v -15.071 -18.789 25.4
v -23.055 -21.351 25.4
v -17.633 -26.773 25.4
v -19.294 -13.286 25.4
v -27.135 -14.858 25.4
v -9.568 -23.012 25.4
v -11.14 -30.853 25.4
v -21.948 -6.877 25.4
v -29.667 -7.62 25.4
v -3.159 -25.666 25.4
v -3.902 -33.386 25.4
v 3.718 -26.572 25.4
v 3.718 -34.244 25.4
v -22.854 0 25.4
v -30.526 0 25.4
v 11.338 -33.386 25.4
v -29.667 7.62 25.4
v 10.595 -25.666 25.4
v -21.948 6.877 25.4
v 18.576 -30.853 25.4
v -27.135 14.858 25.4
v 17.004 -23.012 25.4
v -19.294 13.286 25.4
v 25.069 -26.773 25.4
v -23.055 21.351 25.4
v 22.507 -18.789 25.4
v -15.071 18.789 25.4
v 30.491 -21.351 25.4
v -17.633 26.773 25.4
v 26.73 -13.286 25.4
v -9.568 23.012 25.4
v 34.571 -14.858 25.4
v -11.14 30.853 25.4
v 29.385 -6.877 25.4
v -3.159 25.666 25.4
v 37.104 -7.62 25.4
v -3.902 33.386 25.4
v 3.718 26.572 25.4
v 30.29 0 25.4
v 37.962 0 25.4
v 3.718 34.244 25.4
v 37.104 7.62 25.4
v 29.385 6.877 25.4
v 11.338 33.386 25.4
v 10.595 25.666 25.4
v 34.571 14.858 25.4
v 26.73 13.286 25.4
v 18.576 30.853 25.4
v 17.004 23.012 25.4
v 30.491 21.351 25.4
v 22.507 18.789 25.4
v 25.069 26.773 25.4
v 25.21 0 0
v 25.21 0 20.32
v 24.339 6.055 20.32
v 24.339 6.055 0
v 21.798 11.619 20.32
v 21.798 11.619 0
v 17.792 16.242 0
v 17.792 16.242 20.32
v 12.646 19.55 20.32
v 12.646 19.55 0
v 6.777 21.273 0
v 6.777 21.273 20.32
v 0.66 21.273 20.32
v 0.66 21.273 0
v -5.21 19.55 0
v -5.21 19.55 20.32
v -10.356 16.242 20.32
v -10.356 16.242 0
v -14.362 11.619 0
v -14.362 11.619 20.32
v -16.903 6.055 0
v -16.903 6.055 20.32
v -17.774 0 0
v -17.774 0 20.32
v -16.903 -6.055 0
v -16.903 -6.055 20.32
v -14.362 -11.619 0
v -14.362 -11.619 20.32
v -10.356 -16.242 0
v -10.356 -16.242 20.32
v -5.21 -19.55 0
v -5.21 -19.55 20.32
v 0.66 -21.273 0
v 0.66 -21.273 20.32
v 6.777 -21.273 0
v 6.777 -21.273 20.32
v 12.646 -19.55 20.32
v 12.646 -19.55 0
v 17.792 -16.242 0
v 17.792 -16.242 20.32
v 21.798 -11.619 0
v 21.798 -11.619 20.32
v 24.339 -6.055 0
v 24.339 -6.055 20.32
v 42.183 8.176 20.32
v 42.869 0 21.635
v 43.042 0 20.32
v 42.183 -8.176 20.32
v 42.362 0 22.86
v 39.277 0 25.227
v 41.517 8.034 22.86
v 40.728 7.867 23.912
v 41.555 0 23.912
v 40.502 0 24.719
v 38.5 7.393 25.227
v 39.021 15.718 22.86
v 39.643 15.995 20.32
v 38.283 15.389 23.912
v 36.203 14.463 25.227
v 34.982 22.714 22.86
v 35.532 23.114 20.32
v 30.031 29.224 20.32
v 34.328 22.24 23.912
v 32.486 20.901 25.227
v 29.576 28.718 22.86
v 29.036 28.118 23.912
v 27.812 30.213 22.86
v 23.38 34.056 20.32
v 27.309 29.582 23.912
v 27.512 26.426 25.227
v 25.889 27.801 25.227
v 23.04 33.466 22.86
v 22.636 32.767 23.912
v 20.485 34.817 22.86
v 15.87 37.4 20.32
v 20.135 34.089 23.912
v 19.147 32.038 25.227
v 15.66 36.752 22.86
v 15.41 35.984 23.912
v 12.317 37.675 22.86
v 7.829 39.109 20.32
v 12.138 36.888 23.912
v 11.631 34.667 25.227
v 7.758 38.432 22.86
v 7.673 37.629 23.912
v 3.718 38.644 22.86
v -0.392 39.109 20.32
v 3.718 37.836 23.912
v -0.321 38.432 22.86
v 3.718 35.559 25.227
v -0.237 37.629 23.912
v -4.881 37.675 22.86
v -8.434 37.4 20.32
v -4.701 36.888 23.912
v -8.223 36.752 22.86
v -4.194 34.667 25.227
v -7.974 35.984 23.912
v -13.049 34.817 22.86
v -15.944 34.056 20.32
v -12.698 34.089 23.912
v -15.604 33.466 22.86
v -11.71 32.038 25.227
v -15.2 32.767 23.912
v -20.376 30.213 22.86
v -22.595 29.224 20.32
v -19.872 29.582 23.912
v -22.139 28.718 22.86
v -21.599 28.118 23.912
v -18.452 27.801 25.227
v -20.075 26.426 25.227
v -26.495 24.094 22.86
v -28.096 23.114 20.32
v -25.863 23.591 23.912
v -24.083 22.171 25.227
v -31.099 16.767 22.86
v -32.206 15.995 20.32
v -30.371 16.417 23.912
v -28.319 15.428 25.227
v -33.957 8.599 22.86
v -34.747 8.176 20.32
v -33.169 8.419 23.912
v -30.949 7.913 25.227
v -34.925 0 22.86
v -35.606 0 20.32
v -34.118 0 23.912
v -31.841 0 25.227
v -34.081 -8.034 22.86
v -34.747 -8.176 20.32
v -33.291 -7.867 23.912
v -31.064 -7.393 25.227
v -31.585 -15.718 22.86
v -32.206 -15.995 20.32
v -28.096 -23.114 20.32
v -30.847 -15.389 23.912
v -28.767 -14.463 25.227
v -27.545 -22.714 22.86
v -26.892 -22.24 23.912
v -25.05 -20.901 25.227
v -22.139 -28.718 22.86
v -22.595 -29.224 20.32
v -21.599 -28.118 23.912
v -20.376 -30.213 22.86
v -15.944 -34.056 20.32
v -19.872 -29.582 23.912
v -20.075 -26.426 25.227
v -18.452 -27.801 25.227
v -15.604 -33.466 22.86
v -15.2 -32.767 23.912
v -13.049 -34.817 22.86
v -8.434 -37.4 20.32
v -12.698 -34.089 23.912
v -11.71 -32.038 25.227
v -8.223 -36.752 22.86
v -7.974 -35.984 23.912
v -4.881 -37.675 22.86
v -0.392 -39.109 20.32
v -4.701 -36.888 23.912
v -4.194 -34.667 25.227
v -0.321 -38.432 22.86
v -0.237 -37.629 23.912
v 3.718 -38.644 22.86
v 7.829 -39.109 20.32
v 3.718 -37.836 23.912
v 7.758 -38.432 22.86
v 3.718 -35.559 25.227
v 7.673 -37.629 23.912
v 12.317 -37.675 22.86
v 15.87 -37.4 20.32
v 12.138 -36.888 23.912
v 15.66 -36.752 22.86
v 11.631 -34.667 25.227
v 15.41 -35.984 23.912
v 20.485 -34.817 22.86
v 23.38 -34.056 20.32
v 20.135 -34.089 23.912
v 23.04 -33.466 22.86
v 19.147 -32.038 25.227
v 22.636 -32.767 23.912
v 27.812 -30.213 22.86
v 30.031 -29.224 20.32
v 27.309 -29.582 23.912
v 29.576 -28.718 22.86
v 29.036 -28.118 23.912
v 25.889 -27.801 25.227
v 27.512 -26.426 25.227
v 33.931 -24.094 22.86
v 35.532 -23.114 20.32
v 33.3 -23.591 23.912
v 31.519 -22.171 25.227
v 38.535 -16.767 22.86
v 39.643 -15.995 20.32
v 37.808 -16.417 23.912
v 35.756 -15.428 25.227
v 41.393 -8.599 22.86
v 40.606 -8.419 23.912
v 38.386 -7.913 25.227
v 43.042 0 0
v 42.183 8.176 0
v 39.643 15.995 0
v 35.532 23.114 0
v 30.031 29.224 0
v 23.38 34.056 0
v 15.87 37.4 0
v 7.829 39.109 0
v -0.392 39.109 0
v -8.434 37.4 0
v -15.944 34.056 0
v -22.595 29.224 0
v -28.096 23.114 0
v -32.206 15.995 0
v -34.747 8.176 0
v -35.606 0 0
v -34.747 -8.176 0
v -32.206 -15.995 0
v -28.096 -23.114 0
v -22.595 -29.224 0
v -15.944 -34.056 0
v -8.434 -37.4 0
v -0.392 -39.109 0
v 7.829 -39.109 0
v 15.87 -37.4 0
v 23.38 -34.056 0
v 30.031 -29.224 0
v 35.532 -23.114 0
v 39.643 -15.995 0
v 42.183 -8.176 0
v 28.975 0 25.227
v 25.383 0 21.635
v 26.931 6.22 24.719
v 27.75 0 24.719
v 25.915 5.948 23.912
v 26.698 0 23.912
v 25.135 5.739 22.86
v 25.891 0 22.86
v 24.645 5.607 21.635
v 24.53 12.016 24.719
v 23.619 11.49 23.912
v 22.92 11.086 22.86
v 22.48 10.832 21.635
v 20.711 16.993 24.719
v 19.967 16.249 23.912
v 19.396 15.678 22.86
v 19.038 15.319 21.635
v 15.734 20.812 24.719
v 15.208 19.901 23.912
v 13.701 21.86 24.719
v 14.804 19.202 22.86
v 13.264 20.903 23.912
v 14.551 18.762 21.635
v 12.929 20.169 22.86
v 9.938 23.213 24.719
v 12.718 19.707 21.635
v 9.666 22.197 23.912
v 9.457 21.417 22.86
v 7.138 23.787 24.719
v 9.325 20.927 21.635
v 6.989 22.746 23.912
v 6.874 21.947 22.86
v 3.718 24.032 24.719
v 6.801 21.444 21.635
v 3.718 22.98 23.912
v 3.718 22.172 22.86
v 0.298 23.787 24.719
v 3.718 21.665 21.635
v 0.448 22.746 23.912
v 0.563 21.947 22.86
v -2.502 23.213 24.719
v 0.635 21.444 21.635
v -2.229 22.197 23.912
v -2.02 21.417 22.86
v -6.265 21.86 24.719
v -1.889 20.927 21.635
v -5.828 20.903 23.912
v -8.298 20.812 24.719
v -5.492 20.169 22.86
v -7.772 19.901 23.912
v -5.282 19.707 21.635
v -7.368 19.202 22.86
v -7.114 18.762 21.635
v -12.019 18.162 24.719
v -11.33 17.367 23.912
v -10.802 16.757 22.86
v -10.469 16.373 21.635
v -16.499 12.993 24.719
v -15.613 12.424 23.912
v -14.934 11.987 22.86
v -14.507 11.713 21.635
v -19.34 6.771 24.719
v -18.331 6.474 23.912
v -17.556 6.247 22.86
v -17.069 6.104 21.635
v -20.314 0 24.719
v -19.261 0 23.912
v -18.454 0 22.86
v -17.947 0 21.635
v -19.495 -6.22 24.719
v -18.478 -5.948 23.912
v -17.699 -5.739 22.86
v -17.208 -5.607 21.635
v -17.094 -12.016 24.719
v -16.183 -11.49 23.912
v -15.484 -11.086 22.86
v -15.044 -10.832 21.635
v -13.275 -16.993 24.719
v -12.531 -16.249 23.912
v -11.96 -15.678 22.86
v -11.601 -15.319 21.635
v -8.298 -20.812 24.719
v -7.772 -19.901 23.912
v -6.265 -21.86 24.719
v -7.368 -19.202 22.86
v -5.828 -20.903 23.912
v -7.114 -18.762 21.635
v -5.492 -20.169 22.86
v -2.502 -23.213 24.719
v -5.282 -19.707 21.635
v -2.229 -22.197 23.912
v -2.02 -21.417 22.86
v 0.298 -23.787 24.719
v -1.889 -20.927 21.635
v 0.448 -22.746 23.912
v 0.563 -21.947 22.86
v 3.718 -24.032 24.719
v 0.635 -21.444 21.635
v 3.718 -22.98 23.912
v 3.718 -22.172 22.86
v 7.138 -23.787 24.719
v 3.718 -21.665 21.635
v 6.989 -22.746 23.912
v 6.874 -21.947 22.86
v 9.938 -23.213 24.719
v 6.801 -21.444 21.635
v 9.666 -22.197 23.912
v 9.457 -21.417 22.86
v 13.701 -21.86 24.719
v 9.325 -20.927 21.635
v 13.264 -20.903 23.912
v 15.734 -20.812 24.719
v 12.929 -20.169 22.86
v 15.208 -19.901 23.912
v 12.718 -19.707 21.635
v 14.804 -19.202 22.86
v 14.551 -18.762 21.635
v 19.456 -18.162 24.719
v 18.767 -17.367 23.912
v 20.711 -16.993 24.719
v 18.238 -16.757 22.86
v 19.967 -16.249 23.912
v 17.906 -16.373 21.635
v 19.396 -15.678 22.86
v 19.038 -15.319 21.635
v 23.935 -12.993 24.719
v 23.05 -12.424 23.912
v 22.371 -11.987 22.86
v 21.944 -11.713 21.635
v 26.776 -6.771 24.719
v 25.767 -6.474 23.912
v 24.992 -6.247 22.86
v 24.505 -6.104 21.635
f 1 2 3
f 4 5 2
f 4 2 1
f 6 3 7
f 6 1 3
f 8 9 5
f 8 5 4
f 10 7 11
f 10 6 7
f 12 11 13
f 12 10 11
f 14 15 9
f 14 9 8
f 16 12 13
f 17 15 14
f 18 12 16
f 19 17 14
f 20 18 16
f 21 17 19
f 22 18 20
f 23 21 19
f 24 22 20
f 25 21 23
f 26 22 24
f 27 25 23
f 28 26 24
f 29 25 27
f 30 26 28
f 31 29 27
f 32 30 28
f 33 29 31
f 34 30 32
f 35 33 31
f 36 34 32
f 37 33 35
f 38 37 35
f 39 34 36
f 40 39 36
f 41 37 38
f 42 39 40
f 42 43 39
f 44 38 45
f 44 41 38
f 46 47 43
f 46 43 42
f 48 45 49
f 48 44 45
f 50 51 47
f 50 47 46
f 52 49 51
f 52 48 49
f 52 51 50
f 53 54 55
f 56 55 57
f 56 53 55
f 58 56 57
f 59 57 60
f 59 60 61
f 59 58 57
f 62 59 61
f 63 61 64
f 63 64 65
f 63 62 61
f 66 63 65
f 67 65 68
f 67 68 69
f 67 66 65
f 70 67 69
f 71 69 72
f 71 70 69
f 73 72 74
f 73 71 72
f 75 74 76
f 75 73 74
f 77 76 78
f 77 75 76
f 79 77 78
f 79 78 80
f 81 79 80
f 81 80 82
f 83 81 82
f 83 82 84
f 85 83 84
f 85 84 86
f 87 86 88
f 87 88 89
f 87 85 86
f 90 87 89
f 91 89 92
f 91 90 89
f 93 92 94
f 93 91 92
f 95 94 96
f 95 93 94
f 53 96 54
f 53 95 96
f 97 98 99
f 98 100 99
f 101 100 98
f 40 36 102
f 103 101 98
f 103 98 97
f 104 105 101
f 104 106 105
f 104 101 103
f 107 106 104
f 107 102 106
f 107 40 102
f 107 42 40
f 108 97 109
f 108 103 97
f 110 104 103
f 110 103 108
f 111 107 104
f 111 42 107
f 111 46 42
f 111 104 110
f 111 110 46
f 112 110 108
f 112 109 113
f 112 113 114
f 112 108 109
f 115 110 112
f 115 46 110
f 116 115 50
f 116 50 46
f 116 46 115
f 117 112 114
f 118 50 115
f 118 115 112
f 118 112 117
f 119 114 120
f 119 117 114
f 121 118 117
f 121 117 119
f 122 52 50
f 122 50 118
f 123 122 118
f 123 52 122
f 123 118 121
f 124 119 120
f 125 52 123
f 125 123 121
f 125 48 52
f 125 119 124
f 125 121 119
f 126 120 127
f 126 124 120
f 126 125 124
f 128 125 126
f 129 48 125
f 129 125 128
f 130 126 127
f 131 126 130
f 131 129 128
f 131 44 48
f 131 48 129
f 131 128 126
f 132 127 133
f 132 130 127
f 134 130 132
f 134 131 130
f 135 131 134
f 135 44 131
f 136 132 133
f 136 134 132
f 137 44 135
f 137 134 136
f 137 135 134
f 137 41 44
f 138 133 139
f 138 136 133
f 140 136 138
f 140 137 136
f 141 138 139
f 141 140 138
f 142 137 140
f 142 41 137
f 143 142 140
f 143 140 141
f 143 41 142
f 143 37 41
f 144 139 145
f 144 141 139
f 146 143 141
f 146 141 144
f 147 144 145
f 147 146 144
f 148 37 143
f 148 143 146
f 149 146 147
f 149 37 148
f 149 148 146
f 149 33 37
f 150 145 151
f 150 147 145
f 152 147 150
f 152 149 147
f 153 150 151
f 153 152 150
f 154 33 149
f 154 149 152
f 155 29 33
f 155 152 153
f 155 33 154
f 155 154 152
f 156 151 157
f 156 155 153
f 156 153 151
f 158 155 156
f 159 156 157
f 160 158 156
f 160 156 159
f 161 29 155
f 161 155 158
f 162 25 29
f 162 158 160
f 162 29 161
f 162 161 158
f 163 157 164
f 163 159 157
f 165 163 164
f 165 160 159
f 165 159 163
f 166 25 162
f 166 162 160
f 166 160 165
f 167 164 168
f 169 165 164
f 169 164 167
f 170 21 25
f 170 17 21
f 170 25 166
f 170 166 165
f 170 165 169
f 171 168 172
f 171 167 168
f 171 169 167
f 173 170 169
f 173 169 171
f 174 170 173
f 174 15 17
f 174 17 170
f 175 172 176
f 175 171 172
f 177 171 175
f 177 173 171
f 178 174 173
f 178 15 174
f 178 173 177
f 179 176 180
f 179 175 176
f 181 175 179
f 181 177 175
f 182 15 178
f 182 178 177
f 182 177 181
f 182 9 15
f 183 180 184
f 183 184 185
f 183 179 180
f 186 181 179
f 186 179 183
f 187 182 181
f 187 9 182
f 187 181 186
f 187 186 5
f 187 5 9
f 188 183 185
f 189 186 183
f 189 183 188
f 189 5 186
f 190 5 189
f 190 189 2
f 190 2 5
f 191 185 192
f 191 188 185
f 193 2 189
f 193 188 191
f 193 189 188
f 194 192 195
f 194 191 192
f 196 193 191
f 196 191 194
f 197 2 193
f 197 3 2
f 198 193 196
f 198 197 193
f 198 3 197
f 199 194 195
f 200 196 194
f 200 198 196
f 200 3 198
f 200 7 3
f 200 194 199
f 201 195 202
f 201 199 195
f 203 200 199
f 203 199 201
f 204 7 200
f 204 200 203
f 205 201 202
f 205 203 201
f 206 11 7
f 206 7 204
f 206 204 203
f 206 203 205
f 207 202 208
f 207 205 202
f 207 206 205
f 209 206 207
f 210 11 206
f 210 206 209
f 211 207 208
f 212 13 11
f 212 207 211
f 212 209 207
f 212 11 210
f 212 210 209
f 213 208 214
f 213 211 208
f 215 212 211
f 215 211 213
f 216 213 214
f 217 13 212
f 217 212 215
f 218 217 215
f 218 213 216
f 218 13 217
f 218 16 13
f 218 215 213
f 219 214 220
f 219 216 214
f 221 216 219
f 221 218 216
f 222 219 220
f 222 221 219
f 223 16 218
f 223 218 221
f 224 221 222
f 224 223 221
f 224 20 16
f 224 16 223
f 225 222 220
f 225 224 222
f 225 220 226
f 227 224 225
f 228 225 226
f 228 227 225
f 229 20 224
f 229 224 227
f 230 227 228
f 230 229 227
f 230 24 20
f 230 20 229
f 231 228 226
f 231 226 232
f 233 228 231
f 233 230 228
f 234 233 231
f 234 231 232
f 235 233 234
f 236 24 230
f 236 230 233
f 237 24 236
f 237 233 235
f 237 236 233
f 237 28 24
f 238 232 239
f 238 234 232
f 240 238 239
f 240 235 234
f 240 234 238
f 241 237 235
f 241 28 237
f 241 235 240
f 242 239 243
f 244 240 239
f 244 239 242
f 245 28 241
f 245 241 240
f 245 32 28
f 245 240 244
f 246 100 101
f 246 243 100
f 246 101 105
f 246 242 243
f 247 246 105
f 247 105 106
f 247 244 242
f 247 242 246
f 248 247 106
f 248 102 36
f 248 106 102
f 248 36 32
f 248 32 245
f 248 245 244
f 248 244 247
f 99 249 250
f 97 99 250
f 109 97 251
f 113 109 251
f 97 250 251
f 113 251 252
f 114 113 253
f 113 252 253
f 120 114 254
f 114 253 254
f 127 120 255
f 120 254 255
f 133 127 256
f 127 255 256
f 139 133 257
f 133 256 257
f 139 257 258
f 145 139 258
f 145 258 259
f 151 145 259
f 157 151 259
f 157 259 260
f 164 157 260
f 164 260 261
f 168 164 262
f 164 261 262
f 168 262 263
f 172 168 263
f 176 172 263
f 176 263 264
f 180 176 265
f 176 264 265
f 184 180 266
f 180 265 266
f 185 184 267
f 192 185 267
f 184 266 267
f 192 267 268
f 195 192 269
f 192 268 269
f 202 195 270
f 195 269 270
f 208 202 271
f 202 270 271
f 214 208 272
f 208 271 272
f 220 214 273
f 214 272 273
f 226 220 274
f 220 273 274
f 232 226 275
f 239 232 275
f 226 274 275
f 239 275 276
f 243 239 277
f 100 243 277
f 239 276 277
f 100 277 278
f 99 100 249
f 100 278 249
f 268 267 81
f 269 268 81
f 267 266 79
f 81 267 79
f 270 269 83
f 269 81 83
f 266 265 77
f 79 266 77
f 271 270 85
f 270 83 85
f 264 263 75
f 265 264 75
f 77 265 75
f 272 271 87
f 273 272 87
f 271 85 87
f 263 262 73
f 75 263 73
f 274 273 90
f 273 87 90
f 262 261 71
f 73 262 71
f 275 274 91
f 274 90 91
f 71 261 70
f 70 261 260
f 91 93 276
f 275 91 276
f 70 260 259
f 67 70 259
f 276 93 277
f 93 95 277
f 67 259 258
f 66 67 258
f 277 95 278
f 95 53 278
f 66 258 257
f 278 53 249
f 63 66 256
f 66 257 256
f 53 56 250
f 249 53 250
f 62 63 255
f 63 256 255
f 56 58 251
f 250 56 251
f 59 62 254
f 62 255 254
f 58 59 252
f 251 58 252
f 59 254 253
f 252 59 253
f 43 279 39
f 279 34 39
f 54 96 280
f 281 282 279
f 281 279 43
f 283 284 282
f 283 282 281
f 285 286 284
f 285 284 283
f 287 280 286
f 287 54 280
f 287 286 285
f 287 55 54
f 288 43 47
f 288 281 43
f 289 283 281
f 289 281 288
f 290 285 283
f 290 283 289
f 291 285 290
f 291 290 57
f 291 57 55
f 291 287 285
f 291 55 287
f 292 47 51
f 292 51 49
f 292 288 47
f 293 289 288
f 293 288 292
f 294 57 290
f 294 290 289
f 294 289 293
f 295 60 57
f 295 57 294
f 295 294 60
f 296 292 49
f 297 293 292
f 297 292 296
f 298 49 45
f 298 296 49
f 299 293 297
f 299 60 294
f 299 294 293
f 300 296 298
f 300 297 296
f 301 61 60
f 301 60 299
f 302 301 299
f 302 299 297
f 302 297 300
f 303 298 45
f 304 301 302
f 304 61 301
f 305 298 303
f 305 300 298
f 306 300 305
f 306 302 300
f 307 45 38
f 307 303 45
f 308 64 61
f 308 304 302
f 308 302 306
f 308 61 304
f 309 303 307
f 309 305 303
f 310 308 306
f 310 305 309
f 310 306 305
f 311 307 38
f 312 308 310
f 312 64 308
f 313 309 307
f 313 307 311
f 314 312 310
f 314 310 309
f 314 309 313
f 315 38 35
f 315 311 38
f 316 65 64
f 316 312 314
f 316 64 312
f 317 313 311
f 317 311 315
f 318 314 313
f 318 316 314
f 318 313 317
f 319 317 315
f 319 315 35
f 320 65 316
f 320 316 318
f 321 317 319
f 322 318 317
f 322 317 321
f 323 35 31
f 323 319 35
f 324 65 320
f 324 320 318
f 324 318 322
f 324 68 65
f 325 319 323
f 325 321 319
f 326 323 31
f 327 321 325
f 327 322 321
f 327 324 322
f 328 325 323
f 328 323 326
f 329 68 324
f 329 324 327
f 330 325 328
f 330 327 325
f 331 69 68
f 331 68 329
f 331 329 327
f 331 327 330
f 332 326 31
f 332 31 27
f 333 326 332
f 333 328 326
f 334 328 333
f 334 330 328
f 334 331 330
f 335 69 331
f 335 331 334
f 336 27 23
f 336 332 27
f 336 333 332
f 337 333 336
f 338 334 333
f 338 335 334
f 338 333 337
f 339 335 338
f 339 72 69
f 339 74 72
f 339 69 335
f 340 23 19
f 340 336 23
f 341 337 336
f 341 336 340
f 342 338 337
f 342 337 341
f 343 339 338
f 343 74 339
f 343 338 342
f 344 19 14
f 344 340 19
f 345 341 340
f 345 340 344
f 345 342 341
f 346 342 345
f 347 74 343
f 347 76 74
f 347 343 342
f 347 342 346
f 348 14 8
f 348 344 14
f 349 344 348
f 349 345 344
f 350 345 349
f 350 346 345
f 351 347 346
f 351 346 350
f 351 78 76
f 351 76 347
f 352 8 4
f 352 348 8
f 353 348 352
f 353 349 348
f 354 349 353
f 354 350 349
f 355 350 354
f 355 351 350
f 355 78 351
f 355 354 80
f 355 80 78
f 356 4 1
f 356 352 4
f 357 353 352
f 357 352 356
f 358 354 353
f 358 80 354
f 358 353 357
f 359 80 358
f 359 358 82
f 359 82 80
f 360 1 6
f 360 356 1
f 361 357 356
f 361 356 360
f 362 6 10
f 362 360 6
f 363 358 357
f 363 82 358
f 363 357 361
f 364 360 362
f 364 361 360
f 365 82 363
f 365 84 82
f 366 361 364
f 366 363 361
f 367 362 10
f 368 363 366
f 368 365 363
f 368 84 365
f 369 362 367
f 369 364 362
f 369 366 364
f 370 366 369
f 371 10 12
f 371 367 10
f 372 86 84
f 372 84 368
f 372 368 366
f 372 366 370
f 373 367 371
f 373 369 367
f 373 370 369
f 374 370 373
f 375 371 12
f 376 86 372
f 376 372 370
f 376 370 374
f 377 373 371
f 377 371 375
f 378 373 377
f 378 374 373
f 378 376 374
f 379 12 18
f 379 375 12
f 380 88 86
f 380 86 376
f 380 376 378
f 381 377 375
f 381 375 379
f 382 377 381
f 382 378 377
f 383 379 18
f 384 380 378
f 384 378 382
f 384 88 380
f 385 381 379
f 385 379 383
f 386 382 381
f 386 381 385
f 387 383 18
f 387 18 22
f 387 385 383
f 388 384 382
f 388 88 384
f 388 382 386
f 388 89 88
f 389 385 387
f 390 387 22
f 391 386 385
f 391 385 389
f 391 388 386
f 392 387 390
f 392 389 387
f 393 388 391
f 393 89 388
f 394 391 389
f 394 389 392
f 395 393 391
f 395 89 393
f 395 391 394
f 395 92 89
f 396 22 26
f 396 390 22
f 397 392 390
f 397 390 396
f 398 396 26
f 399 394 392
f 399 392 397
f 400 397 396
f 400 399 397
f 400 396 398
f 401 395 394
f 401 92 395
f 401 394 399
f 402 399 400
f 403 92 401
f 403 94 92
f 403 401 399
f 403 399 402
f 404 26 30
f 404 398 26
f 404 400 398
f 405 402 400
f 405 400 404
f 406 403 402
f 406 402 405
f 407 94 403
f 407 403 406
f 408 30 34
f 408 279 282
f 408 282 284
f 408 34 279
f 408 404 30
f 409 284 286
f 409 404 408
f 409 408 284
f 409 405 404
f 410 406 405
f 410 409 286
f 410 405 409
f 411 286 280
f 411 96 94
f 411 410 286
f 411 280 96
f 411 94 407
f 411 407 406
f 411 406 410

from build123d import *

# Parameters (mm, degrees)
F0_R     = 39.324238
F0_R_2   = 21.491719
F1_DEPTH = 18.288
F2_DEPTH = 25.4
F3_R     = 5.08


with BuildPart() as f1:
    # F0 (on Top) → F1 (new body)
    with BuildSketch(Plane.XY):
        with Locations((3.718213, 0)):
            Circle(F0_R)
        with Locations((3.718213, 0)):
            Circle(F0_R_2, mode=Mode.SUBTRACT)
    extrude(amount=F1_DEPTH)

    # F0 (on Top) → F2 (join)
    with BuildSketch(Plane.XY):
        with Locations((3.718213, 0)):
            Circle(F0_R)
        with Locations((3.718213, 0)):
            Circle(F0_R_2, mode=Mode.SUBTRACT)
    extrude(amount=F2_DEPTH)

    # F3
    f3_edges = [f1.edges().sort_by_distance(p)[0] for p in [
        (-35.606025, 0, 25.4),
        (-17.773505, 0, 25.4),
    ]]
    fillet(f3_edges, radius=F3_R)


solid = f1.part
